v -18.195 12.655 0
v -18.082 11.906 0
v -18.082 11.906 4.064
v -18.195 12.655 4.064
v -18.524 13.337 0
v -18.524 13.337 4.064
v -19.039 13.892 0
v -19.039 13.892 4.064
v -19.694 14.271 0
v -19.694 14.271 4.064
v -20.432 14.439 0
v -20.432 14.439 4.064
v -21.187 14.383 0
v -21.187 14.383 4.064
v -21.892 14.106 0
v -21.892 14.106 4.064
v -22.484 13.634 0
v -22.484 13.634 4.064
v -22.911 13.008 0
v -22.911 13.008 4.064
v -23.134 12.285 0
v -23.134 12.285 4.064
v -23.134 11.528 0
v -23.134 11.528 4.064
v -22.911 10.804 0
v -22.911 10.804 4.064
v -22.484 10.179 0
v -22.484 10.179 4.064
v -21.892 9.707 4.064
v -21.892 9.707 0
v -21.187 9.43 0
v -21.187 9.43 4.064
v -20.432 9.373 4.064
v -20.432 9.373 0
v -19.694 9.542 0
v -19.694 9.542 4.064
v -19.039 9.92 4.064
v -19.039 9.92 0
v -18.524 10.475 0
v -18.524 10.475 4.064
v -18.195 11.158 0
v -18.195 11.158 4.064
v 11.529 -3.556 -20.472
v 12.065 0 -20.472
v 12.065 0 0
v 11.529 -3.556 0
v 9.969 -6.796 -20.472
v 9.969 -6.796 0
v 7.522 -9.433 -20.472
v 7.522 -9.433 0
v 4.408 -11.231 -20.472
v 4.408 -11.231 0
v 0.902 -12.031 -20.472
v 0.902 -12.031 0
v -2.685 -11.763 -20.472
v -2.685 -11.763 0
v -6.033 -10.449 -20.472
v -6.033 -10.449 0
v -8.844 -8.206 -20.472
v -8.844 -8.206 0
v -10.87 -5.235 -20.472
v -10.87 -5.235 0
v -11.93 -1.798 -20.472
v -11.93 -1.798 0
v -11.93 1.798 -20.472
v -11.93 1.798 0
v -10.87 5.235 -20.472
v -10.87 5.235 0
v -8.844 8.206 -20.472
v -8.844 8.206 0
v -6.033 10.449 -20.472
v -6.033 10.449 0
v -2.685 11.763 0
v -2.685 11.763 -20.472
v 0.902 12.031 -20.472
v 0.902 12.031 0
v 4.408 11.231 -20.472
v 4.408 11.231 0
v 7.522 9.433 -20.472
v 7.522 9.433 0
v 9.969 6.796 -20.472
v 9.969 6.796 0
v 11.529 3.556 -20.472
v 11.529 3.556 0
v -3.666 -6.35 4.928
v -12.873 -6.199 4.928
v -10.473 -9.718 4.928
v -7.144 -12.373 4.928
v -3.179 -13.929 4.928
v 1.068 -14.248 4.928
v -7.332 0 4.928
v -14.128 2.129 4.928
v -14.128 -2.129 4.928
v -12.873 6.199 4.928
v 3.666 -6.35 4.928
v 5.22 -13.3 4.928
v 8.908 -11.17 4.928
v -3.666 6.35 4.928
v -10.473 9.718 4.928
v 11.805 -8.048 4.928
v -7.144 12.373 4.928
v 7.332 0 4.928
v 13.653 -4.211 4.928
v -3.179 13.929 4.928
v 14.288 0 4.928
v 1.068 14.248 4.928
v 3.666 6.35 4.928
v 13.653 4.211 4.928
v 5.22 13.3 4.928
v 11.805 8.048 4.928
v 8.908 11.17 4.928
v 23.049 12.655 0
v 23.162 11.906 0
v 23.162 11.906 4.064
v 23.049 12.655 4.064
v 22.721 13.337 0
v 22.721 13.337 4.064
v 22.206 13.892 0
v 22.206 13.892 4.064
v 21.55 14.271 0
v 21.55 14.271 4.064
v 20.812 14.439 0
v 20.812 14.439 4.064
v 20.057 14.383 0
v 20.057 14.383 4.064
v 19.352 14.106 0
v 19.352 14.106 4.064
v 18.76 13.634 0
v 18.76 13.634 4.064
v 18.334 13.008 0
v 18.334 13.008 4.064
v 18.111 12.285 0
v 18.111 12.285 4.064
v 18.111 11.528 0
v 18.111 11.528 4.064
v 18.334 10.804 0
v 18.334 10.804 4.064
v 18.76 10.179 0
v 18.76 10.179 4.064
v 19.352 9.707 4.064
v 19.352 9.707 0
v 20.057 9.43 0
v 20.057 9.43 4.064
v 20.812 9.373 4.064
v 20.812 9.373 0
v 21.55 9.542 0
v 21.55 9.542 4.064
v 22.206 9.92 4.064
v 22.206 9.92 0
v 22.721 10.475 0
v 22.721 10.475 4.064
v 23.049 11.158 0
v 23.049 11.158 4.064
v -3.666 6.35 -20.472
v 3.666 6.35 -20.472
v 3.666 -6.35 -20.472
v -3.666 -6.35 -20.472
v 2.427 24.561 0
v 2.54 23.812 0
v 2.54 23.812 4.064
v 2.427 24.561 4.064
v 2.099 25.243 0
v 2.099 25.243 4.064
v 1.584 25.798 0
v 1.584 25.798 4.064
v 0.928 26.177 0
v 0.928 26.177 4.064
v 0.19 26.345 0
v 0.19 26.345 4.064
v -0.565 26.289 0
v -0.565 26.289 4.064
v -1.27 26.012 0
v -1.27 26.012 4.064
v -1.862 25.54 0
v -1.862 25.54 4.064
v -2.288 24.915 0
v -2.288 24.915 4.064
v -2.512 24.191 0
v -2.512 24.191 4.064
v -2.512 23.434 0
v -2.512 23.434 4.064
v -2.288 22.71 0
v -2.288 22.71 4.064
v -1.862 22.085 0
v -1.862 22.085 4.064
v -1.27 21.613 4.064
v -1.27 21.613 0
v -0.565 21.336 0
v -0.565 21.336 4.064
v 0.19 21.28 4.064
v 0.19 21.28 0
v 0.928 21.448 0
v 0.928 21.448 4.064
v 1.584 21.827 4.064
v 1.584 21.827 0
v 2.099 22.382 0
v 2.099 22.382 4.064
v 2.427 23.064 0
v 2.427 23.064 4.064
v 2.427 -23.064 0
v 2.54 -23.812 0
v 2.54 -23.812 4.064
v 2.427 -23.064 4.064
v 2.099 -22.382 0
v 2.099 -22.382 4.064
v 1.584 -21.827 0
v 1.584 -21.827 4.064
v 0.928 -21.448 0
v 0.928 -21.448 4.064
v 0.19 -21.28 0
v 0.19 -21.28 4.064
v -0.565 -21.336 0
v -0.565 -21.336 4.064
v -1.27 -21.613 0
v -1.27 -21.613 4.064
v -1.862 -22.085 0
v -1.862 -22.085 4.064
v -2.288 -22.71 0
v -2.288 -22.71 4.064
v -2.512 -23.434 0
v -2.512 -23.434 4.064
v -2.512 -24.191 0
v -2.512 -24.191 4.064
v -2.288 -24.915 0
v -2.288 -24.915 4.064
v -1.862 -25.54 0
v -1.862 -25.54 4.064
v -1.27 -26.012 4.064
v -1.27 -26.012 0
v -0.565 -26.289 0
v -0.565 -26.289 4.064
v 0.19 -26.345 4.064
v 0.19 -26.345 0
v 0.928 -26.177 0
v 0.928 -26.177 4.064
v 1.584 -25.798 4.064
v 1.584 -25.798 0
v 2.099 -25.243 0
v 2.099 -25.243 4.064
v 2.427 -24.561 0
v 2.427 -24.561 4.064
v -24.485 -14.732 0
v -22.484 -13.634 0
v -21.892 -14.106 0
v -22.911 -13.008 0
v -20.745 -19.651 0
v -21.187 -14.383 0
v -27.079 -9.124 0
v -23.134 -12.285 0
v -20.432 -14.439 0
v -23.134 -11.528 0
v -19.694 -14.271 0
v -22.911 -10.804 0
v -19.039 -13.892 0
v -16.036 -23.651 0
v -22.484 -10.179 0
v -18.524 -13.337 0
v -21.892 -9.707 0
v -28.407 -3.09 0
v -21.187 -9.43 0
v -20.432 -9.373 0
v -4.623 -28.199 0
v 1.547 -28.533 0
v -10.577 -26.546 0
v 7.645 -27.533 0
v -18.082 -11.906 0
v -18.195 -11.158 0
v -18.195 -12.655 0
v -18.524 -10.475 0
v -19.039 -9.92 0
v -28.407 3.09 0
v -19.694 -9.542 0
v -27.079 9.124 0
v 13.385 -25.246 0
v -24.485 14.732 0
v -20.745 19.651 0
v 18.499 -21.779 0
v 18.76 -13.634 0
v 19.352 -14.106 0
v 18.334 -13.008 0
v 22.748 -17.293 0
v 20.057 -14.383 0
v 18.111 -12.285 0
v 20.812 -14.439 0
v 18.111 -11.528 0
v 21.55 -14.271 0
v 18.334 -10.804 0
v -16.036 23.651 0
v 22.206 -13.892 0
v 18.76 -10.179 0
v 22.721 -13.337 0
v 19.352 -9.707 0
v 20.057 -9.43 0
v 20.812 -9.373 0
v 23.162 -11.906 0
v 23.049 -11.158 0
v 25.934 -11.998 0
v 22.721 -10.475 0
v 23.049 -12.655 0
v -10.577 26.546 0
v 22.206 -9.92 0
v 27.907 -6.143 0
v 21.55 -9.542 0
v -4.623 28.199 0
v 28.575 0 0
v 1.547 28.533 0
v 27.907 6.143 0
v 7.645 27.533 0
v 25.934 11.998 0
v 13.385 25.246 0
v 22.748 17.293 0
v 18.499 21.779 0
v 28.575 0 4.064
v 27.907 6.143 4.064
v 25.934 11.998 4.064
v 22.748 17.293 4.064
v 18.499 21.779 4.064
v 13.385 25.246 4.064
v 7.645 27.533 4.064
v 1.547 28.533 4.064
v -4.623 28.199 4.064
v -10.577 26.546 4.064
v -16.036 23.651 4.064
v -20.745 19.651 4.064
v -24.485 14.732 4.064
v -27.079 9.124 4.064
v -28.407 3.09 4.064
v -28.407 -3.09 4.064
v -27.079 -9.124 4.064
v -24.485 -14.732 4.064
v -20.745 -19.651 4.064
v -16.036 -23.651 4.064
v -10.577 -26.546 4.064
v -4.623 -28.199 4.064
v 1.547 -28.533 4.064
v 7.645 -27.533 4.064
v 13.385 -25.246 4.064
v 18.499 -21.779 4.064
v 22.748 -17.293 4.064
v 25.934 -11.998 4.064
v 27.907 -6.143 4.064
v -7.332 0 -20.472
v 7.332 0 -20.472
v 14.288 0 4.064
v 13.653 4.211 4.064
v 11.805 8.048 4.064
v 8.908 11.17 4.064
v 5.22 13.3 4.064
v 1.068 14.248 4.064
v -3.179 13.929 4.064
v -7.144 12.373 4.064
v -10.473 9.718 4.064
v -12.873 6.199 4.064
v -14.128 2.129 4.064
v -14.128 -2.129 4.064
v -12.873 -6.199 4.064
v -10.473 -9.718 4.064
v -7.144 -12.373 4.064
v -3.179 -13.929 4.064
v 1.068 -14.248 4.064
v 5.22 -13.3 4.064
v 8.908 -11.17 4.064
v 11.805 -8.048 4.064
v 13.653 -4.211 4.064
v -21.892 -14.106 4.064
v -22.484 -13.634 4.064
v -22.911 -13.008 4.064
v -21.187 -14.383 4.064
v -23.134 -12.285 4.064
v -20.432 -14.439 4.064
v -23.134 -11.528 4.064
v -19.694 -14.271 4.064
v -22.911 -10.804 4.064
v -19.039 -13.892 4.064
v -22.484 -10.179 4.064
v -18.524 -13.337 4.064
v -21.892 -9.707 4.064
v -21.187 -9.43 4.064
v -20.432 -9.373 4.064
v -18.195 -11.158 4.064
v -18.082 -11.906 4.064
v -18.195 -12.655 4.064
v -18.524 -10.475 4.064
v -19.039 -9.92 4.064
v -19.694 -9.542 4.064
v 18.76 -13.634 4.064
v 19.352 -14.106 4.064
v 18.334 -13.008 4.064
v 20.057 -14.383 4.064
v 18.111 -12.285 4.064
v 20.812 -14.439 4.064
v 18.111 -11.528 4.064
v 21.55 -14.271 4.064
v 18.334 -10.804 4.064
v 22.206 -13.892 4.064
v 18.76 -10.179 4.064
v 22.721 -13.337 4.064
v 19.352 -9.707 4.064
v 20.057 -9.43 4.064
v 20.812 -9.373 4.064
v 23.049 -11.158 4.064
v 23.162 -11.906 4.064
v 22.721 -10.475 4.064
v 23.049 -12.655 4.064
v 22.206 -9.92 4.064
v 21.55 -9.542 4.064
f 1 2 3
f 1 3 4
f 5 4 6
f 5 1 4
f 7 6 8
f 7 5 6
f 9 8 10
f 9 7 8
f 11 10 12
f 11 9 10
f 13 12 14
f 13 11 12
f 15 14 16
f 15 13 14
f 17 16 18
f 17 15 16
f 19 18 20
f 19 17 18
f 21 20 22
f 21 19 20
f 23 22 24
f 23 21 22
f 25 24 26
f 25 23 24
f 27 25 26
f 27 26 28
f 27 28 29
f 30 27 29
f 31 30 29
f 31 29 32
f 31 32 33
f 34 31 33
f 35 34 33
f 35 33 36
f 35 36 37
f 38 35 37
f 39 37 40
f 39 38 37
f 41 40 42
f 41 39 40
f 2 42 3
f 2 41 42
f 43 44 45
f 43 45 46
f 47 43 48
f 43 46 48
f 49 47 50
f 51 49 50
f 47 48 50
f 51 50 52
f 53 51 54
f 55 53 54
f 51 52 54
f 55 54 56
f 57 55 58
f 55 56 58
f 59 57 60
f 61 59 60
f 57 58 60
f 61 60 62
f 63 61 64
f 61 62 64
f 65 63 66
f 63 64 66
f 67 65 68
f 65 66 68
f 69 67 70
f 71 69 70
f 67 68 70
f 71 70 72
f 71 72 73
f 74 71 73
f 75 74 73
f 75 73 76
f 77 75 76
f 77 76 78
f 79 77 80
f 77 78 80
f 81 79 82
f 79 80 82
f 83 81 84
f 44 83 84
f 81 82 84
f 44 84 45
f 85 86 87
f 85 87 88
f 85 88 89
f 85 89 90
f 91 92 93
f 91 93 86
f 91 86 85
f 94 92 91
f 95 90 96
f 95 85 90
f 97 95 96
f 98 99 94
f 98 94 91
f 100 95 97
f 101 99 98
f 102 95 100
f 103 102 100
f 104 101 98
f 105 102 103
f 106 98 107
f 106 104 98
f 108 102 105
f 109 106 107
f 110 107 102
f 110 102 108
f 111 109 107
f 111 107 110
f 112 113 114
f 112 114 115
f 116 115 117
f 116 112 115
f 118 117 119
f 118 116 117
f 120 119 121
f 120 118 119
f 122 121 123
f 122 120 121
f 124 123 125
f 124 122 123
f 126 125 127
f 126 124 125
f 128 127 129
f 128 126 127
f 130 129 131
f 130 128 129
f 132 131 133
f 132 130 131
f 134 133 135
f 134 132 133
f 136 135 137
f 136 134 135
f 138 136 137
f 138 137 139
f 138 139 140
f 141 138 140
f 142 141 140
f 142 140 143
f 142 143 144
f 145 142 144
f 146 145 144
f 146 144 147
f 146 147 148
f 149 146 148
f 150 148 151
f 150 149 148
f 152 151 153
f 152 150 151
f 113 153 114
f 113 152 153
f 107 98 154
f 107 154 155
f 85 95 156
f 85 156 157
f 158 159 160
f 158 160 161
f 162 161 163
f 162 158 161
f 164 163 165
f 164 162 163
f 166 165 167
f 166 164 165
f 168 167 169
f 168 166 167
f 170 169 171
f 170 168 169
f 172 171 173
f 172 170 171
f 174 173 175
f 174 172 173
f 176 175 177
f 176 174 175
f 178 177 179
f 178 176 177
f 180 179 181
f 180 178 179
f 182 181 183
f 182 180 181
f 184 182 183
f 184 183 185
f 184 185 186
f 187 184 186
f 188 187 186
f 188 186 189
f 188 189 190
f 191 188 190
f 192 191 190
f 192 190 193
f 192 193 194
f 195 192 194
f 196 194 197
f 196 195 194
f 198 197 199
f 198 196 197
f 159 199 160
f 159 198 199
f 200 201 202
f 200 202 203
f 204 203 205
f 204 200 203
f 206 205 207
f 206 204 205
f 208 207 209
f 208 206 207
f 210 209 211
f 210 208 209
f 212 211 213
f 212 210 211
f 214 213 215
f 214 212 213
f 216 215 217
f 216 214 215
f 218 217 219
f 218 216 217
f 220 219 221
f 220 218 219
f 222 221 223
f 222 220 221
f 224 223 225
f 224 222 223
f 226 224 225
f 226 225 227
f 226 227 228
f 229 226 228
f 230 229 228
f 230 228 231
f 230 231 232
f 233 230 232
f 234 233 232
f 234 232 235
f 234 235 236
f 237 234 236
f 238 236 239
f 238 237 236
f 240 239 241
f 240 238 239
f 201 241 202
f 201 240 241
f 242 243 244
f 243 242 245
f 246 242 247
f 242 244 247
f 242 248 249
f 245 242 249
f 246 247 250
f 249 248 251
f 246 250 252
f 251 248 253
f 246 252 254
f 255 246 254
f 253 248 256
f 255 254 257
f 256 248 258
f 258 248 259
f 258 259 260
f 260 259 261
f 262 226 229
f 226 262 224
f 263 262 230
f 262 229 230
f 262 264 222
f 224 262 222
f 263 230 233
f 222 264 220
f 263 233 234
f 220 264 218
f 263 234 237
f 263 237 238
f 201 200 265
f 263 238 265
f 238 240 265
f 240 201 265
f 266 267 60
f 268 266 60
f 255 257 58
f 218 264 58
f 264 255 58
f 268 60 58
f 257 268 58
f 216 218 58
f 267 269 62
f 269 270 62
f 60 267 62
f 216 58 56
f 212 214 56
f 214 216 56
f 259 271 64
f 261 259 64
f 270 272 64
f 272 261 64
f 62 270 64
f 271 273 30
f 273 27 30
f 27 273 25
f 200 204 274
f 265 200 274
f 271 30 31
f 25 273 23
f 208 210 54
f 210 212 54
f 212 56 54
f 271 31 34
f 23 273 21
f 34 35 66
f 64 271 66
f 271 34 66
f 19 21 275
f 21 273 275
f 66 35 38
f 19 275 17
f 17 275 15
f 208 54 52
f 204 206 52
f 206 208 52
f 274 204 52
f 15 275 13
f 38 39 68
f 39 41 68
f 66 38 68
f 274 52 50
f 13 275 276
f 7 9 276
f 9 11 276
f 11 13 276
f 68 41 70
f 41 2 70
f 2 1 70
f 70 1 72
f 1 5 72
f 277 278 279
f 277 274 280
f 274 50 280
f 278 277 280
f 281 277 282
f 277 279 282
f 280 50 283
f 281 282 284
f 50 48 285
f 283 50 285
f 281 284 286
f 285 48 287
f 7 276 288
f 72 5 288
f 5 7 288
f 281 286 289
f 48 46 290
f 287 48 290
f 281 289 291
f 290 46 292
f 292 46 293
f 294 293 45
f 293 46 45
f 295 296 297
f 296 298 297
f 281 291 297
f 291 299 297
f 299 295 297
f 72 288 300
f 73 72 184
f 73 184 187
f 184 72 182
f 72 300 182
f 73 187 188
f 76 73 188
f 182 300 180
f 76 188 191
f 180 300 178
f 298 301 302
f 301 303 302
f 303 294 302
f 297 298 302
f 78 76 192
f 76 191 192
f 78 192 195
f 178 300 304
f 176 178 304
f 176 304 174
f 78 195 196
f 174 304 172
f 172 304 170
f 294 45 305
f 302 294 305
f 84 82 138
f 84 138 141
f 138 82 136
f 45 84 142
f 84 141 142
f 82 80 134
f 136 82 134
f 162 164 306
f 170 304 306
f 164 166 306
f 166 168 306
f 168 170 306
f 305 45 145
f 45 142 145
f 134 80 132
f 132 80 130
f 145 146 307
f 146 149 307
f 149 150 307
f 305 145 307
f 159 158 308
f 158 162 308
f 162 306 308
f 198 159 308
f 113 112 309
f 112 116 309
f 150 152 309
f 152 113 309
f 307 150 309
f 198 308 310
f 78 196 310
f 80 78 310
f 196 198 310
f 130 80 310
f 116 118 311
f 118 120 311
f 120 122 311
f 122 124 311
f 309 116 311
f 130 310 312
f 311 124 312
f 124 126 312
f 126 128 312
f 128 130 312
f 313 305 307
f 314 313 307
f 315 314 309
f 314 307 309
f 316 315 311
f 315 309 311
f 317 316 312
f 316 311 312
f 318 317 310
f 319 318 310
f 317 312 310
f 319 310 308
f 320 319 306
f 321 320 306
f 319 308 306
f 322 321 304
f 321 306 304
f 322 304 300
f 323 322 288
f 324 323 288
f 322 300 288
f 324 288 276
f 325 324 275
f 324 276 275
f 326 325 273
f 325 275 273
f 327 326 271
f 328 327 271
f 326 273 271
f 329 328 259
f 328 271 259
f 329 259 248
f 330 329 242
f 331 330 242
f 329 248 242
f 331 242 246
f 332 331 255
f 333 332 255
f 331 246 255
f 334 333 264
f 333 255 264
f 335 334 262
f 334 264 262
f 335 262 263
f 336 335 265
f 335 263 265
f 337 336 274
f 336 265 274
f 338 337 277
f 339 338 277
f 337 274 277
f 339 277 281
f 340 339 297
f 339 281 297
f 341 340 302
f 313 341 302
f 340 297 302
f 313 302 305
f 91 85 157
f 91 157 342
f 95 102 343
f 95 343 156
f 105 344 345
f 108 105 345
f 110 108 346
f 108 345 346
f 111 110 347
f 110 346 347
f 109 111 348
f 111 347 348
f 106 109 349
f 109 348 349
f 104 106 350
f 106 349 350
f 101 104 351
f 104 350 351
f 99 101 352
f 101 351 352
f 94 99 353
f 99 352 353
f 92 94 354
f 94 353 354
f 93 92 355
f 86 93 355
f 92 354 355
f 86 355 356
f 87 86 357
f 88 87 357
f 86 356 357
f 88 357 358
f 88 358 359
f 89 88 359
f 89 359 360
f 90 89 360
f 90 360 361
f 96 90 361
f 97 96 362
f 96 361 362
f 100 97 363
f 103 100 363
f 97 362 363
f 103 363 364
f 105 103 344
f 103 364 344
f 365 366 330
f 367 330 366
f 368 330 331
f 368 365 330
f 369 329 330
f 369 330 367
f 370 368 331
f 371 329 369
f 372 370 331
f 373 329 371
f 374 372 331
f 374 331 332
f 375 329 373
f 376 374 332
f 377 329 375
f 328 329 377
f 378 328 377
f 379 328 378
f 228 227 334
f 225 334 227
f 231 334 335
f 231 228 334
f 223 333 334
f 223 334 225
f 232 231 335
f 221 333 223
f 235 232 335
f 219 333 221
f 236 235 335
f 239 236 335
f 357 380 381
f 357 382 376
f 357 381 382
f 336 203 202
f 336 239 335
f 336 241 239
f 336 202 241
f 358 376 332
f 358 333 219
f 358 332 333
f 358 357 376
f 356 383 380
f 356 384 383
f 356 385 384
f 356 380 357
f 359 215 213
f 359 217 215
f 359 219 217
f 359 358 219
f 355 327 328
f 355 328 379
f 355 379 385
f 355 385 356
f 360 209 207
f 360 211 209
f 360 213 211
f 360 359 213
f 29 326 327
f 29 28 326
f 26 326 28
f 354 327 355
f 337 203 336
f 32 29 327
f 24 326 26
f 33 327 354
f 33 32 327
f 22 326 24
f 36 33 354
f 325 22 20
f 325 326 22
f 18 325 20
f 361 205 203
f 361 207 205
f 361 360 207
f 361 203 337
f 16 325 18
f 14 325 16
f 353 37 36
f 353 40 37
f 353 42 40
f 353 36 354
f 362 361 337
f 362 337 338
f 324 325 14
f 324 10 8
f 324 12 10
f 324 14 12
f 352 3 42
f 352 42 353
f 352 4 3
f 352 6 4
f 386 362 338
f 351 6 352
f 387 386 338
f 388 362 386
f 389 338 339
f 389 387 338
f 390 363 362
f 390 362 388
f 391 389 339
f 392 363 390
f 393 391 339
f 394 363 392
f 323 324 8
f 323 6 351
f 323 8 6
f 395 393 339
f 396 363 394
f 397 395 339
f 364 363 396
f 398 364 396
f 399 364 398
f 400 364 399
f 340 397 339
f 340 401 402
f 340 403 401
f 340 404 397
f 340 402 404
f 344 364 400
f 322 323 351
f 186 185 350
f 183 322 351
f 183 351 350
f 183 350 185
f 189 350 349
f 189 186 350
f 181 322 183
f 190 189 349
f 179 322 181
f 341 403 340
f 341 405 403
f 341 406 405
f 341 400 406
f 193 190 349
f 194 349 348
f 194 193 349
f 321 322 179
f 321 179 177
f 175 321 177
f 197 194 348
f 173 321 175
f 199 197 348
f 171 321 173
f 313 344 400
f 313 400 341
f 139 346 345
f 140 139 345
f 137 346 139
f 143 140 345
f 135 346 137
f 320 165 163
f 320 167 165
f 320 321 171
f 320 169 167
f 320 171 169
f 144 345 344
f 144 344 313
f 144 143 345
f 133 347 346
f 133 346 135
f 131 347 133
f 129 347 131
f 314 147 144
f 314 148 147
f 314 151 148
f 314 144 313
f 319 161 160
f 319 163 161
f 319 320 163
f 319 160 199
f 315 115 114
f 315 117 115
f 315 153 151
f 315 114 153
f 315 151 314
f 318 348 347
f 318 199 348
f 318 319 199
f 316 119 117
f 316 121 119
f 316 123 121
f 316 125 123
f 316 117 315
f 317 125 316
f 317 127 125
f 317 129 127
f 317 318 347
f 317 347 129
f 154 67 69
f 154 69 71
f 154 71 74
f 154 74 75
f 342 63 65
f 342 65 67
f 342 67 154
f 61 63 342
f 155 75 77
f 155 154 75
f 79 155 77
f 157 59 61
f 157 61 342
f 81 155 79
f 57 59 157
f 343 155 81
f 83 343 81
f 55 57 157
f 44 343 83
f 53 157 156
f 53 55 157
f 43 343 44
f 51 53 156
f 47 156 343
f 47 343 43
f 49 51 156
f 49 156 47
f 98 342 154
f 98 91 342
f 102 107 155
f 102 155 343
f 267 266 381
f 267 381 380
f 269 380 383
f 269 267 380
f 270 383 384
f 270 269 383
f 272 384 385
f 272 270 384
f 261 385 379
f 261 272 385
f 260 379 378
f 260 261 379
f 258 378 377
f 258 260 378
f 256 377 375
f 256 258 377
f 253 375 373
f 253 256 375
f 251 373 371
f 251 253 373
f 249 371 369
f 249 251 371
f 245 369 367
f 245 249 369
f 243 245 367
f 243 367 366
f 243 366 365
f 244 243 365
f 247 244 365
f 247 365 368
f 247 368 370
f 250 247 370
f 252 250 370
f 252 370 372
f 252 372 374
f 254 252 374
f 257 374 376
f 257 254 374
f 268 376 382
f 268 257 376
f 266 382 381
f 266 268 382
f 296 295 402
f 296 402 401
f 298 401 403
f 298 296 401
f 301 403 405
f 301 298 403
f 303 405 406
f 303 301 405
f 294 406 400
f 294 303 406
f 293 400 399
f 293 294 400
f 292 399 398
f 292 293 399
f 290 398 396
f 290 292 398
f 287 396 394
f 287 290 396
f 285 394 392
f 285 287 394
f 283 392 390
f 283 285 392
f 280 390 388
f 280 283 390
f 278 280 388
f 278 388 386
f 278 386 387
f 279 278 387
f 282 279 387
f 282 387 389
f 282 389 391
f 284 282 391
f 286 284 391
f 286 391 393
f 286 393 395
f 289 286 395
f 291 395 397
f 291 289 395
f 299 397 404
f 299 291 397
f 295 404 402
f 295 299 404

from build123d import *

# Parameters (mm, degrees)
SKETCH1_R           = 28.575
SKETCH1_R_2         = 2.54
BOSS_EXTRUDE1_DEPTH = 4.064
SKETCH2_R           = 14.2875
BOSS_EXTRUDE2_DEPTH = 0.8636
SKETCH3_R           = 12.065
EXTRUDE_M_DEPTH     = 20.4724


with BuildPart() as part:
    # Sketch1 → Boss-Extrude1 (new body)
    with BuildSketch(Plane.XY):
        Circle(SKETCH1_R)
        with Locations((0, 23.8125)):
            Circle(SKETCH1_R_2, mode=Mode.SUBTRACT)
        with Locations((20.622229928, 11.90625)):
            Circle(SKETCH1_R_2, mode=Mode.SUBTRACT)
        with Locations((20.622229928, -11.90625)):
            Circle(SKETCH1_R_2, mode=Mode.SUBTRACT)
        with Locations((0, -23.8125)):
            Circle(SKETCH1_R_2, mode=Mode.SUBTRACT)
        with Locations((-20.622229928, -11.90625)):
            Circle(SKETCH1_R_2, mode=Mode.SUBTRACT)
        with Locations((-20.622229928, 11.90625)):
            Circle(SKETCH1_R_2, mode=Mode.SUBTRACT)
        Polygon((7.332348419, 0), (3.666174209, 6.35), (-3.666174209, 6.35), (-7.332348419, 0), (-3.666174209, -6.35), (3.666174209, -6.35), align=None, mode=Mode.SUBTRACT)
    extrude(amount=BOSS_EXTRUDE1_DEPTH)

    # Sketch2 → Boss-Extrude2 (add)
    with BuildSketch(Plane.XY.offset(4.064)):
        Circle(SKETCH2_R)
        Polygon((-3.666174209, 6.35), (3.666174209, 6.35), (7.332348419, 0), (3.666174209, -6.35), (-3.666174209, -6.35), (-7.332348419, 0), align=None, mode=Mode.SUBTRACT)
    extrude(amount=BOSS_EXTRUDE2_DEPTH)

    # Sketch3 → Extrude m (add)
    with BuildSketch(Plane(origin=(0, 0, 0), x_dir=(-1, 0, 0), z_dir=(0, 0, -1))):
        with Locations(Location((0, 0, 0), (0, 0, 180))):
            Circle(SKETCH3_R)
        Polygon((7.332348419, 0), (3.666174209, 6.35), (-3.666174209, 6.35), (-7.332348419, 0), (-3.666174209, -6.35), (3.666174209, -6.35), align=None, mode=Mode.SUBTRACT)
    extrude(amount=EXTRUDE_M_DEPTH)


solid = part.part
